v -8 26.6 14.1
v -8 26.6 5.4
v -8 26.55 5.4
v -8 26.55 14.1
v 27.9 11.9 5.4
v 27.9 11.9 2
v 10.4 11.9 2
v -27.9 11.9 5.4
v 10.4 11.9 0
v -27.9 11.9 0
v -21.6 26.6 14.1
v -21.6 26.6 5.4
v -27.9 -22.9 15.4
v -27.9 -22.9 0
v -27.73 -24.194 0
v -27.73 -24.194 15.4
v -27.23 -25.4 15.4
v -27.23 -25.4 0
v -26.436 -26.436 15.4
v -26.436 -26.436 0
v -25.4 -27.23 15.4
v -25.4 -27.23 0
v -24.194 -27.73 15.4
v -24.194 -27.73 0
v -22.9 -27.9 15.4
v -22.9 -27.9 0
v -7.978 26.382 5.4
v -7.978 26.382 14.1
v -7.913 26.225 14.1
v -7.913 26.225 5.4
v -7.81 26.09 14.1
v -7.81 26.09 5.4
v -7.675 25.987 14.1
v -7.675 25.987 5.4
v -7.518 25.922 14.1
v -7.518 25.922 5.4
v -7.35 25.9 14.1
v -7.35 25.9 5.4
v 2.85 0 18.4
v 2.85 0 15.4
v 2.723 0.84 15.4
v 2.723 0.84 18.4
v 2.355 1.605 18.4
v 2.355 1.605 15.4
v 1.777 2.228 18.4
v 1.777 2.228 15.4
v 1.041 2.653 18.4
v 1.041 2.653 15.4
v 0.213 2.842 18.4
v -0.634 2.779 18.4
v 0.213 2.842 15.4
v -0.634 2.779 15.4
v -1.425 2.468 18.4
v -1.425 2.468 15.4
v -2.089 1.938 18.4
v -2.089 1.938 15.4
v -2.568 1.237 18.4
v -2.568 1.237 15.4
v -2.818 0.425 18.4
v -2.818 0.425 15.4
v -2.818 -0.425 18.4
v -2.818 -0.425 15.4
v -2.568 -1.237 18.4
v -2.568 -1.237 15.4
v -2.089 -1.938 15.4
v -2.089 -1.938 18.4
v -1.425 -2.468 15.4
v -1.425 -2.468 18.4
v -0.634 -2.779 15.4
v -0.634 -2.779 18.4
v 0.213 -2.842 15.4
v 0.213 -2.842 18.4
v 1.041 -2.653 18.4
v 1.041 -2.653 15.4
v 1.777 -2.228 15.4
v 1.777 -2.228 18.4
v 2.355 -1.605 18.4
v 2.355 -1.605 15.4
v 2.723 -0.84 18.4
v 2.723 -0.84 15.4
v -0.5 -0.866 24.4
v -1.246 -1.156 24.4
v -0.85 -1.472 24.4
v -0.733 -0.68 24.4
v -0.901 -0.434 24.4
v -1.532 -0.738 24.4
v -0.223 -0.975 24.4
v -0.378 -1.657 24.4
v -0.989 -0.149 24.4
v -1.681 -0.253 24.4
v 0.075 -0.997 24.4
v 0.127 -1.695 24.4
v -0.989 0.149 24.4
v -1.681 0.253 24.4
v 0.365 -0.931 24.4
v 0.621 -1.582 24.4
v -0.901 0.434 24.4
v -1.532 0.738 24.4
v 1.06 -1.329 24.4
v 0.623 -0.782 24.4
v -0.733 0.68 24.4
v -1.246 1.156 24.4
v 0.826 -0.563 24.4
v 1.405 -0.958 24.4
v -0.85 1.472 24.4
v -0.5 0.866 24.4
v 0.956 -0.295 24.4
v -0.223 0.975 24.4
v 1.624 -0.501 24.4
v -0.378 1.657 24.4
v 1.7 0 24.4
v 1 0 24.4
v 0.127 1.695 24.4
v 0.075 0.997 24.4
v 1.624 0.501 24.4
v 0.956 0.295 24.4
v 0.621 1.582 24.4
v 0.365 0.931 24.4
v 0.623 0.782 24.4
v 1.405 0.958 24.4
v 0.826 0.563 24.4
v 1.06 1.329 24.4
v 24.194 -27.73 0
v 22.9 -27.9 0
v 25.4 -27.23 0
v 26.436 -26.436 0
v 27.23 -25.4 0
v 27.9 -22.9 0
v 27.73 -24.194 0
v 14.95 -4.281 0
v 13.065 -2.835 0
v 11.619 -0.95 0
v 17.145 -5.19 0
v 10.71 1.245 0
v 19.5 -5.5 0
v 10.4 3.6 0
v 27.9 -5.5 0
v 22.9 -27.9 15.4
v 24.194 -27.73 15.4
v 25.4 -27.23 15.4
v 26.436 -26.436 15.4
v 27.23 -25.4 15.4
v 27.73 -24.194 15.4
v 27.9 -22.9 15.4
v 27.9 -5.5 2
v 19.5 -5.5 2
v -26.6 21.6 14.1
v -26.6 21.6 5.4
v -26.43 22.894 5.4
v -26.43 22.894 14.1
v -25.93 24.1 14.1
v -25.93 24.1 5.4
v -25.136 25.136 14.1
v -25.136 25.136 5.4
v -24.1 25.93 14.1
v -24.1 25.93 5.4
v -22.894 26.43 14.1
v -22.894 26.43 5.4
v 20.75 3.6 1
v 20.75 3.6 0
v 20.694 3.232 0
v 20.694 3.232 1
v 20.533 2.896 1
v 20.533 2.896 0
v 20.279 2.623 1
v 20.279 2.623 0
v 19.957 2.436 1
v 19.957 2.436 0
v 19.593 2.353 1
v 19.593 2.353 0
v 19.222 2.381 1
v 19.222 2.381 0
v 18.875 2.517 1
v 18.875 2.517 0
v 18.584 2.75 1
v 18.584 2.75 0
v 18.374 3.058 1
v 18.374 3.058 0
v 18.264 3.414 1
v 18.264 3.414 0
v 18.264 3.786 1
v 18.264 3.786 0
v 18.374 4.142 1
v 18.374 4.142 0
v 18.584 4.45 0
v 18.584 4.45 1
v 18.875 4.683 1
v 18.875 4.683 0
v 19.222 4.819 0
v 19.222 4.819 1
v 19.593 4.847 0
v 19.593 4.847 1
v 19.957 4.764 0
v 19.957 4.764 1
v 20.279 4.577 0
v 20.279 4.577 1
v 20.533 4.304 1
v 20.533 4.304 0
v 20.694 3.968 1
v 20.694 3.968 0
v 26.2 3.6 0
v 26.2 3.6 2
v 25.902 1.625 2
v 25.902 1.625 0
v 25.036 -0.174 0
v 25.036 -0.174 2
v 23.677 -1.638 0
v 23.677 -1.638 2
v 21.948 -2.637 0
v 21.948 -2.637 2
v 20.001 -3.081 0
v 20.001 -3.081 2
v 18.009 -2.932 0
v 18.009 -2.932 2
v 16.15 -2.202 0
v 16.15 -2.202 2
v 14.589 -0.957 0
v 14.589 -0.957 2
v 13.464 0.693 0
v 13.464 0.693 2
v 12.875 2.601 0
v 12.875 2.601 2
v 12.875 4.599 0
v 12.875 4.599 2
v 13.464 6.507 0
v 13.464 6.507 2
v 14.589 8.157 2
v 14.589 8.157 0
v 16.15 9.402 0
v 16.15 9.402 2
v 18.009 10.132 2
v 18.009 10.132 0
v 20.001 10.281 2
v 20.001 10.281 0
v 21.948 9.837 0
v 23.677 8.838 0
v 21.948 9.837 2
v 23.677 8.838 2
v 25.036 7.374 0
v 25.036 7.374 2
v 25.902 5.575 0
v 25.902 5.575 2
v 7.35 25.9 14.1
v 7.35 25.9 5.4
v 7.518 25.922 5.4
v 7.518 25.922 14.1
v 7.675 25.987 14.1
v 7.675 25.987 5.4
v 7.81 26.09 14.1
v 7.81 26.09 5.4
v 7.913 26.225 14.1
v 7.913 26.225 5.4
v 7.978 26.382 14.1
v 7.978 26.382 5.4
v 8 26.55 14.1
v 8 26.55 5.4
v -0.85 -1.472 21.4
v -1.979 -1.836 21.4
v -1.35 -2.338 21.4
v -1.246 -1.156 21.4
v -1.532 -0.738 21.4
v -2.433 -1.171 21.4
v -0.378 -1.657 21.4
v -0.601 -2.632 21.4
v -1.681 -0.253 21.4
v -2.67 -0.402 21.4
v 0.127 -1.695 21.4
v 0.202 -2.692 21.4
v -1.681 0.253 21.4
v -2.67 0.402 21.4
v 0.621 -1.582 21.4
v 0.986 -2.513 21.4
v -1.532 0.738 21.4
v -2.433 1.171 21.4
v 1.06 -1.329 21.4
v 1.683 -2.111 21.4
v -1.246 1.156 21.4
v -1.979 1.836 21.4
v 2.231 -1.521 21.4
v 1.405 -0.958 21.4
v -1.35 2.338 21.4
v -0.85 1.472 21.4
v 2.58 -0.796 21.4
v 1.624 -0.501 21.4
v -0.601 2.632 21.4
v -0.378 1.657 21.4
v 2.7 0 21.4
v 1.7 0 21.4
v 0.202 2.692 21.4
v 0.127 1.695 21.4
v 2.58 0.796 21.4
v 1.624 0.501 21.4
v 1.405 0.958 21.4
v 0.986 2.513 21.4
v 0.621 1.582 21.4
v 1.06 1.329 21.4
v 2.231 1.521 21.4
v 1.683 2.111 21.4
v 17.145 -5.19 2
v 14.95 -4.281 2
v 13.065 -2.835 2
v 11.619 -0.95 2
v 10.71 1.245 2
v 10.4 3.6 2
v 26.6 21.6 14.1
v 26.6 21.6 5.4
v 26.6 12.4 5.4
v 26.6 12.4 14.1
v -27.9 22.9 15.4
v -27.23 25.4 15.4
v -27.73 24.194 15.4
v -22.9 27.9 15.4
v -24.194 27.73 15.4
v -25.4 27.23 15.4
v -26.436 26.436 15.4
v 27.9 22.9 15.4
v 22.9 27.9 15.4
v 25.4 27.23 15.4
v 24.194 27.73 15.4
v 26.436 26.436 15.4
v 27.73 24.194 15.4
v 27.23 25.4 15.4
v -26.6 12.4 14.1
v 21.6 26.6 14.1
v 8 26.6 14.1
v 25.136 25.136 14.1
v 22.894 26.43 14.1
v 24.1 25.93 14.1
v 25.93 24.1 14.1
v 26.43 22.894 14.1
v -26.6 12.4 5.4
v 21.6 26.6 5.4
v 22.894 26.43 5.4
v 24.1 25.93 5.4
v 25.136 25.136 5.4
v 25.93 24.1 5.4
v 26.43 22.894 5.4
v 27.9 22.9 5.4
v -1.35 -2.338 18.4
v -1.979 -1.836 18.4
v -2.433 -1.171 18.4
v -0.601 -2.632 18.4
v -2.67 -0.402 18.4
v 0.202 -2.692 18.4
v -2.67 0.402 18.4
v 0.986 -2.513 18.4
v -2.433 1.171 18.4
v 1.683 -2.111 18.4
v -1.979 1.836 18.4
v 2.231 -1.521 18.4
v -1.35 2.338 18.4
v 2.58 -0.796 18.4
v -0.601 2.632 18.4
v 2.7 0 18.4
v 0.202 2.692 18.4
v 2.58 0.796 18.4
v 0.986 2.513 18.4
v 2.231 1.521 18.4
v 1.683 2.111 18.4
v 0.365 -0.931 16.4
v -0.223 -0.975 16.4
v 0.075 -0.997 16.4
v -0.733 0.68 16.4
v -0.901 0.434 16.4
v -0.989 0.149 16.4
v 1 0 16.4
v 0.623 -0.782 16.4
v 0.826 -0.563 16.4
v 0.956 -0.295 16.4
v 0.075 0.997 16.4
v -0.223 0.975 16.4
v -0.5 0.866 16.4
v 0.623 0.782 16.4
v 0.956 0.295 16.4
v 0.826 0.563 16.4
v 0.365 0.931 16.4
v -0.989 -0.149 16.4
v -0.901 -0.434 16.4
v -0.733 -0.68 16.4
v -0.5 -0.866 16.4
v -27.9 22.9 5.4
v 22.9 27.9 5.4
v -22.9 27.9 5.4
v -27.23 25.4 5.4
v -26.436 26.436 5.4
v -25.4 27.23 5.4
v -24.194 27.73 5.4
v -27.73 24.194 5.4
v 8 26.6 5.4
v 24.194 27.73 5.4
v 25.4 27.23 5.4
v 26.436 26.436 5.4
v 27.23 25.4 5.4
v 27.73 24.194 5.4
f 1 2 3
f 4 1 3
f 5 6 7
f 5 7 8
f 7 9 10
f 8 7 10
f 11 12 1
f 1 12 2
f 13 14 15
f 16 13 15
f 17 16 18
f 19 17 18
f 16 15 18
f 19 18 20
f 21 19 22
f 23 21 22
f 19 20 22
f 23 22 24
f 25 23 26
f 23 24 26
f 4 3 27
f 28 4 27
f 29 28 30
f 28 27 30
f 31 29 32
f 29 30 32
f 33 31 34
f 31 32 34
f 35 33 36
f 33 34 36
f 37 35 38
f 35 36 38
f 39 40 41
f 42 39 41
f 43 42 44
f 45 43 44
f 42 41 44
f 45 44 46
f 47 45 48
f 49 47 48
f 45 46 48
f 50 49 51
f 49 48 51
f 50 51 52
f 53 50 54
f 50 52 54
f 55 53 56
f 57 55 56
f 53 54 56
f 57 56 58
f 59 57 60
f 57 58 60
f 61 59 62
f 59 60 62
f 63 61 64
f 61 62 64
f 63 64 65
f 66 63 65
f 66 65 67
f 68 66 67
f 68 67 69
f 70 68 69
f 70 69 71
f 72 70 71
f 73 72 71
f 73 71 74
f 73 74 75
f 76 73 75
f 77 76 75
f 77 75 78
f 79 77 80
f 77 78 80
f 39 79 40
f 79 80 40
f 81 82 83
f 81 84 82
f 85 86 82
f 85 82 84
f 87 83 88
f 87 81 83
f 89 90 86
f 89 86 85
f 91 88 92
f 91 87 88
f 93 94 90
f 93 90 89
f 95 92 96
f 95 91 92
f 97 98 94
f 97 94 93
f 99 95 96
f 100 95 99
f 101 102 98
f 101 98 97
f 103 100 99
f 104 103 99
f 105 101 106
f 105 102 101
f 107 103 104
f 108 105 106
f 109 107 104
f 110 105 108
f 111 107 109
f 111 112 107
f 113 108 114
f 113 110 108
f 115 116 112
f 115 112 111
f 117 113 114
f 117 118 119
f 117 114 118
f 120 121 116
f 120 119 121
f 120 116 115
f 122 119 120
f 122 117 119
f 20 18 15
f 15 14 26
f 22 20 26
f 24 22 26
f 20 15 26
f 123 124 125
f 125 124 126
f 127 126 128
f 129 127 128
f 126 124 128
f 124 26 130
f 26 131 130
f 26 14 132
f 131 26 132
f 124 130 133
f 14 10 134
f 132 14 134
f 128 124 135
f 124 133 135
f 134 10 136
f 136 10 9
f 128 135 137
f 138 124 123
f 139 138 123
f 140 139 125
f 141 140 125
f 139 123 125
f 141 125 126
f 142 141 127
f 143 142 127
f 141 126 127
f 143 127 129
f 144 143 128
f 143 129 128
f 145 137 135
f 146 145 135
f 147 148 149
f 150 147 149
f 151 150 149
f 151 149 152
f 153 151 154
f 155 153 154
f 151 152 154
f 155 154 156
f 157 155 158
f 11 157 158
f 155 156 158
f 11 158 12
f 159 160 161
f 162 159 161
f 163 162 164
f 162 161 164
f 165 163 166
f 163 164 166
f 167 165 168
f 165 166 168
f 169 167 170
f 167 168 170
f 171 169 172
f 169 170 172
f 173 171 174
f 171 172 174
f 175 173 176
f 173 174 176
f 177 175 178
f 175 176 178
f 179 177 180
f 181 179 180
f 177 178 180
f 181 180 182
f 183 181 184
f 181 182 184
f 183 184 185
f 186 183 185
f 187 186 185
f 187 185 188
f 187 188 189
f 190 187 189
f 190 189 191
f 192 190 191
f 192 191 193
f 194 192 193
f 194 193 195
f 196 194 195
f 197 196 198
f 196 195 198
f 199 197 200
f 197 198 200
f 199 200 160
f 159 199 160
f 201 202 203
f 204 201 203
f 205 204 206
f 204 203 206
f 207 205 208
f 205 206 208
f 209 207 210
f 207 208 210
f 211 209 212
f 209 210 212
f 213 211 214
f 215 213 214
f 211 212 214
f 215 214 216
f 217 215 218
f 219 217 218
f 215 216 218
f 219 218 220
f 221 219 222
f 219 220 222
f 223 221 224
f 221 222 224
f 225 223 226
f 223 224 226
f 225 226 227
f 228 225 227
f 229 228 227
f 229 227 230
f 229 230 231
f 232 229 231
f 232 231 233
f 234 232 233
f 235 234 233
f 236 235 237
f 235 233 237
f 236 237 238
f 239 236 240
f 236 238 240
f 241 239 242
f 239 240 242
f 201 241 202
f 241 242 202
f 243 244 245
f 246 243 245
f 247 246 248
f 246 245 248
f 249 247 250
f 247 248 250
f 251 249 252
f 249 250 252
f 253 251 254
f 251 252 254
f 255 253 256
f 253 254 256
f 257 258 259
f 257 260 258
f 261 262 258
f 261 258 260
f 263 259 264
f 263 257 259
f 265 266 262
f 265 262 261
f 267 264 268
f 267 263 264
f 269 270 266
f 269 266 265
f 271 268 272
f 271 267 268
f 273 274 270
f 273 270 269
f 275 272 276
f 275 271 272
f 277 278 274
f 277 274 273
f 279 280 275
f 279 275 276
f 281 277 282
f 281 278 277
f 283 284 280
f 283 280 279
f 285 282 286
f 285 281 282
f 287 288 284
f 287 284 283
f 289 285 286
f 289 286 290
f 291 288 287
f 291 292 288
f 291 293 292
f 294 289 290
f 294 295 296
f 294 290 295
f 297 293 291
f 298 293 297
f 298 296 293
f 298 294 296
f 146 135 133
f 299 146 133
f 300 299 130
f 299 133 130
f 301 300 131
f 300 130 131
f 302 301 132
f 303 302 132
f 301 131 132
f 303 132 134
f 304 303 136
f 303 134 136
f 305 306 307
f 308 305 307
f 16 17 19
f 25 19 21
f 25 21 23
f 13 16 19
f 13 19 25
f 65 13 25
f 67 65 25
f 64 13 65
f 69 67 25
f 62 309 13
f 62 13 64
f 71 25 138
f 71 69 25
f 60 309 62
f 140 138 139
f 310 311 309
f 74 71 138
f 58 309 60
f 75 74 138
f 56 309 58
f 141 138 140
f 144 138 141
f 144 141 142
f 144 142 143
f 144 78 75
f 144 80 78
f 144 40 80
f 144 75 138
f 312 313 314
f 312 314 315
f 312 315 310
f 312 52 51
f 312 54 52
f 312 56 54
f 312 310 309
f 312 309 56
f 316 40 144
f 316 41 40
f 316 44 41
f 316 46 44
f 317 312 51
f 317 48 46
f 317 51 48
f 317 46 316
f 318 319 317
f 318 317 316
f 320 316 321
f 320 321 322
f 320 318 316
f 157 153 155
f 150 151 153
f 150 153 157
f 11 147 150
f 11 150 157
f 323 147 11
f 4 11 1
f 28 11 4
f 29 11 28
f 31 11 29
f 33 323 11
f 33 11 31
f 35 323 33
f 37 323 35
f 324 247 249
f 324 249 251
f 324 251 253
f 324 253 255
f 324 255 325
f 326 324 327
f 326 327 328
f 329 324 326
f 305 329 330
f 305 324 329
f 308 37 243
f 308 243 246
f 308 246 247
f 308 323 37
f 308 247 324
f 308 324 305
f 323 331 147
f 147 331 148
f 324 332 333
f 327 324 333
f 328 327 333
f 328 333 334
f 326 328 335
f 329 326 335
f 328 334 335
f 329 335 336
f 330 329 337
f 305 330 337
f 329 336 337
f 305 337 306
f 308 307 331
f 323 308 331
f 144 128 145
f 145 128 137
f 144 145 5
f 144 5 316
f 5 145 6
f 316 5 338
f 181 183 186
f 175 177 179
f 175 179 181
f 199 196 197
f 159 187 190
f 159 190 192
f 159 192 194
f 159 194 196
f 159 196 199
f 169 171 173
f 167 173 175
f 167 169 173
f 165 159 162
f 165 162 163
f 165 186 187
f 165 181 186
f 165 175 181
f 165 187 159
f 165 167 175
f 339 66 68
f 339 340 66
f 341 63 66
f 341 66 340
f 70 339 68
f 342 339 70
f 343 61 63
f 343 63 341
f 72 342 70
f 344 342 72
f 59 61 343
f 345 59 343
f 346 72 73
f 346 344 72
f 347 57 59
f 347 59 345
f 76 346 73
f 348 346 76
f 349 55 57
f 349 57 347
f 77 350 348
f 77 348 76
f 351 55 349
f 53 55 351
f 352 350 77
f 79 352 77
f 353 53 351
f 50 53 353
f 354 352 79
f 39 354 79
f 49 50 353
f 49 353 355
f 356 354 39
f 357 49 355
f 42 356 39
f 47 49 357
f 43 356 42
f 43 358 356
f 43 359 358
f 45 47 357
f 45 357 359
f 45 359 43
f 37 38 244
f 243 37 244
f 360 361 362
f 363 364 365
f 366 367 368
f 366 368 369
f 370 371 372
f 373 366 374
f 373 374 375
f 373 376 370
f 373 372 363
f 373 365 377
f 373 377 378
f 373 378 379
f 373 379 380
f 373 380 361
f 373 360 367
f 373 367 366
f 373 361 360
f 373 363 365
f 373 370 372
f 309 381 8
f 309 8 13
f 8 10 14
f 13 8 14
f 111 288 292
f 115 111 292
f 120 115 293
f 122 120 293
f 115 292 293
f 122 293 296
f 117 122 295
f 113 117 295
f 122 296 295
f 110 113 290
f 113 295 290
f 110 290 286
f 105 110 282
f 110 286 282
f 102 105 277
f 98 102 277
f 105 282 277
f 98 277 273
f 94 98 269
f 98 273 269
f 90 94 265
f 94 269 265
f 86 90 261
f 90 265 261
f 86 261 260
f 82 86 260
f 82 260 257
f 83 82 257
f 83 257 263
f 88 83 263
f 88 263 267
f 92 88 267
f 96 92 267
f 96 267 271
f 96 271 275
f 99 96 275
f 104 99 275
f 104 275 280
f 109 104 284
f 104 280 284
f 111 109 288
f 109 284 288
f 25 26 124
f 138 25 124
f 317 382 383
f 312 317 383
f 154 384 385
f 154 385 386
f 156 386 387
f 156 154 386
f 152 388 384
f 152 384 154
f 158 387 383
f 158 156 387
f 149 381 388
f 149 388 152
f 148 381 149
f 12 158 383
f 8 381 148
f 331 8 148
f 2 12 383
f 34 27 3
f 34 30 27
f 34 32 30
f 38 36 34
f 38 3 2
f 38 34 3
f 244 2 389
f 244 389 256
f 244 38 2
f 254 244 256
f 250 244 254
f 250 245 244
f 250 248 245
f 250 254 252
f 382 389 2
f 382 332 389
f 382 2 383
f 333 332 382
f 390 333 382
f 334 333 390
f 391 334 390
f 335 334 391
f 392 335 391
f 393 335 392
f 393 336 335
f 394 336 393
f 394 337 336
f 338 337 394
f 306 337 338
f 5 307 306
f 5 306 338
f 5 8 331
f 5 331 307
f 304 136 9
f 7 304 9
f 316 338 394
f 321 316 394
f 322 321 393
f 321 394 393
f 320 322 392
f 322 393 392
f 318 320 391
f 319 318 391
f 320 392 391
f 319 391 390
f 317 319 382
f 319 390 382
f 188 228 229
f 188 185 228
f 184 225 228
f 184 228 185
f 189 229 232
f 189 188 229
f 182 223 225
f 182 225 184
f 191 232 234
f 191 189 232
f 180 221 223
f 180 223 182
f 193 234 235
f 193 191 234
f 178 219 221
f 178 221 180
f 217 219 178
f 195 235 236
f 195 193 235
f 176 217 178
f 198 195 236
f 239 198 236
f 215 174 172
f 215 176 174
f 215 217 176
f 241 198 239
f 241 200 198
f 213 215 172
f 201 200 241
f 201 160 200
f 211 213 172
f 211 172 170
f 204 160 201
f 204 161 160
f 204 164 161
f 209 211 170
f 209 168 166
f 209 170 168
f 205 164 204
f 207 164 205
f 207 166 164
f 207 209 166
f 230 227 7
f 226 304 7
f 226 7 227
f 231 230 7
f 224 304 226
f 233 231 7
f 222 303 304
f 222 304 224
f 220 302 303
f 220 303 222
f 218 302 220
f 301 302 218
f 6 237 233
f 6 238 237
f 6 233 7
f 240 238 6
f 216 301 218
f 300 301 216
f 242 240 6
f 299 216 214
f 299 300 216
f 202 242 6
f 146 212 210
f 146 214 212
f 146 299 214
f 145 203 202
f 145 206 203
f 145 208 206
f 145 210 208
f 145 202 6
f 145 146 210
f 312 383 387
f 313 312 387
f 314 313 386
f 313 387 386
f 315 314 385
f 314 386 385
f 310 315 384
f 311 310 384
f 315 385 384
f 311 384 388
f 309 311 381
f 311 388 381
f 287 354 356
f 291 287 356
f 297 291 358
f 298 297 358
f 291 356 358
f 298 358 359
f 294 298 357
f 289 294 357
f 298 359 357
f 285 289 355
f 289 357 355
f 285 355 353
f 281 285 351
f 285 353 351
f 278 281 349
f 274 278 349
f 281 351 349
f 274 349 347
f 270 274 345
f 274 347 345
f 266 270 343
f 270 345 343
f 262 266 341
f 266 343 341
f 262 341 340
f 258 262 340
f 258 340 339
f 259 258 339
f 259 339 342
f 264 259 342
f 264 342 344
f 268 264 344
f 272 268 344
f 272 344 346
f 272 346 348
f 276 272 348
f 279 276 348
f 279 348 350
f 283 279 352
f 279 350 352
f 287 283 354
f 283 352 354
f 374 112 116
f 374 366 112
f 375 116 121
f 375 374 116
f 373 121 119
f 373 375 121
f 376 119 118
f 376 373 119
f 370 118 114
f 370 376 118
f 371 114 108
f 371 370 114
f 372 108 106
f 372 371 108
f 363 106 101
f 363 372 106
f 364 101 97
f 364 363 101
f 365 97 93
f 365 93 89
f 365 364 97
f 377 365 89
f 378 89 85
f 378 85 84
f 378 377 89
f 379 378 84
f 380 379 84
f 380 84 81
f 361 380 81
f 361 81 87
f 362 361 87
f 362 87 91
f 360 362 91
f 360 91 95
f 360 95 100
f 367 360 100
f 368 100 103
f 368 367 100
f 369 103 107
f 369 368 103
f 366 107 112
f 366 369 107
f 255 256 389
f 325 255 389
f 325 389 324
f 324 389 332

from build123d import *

# Parameters (mm, degrees)
F1_DEPTH  = 15.4
F3_DEPTH  = 5.4
F5_DEPTH  = 2
F6_R      = 6.7
F7_DEPTH  = 2
F9_DEPTH  = 8.7
F10_R     = 1.25
F11_DEPTH = 1
F12_R     = 2.85
F13_DEPTH = 3
F14_R     = 2.7
F15_DEPTH = 3
F16_R     = 1
F17_DEPTH = 5
F18_R     = 1.7
F18_R_2   = 1
F19_DEPTH = 3


with BuildPart() as f1:
    # F0 (on Top) → F1 (new body)
    with BuildSketch(Plane.XY):
        with BuildLine():
            Line((-22.9, -27.9), (22.9, -27.9))
            ThreePointArc((22.9, -27.9), (26.4355339059, -26.4355339059), (27.9, -22.9))
            Line((27.9, -22.9), (27.9, 22.9))
            ThreePointArc((27.9, 22.9), (26.4355339059, 26.4355339059), (22.9, 27.9))
            Line((22.9, 27.9), (-22.9, 27.9))
            ThreePointArc((-22.9, 27.9), (-26.4355339059, 26.4355339059), (-27.9, 22.9))
            Line((-27.9, 22.9), (-27.9, -22.9))
            ThreePointArc((-27.9, -22.9), (-26.4355339059, -26.4355339059), (-22.9, -27.9))
        make_face()
    extrude(amount=F1_DEPTH)

    # F2 (on face) → F3 (cut)
    with BuildSketch(Plane(origin=(0, 0, 0), x_dir=(1, 0, 0), z_dir=(0, 0, -1))):
        with BuildLine():
            Line((27.9, -11.9), (-27.9, -11.9))
            Line((-27.9, -11.9), (-27.9, -22.9))
            ThreePointArc((-27.9, -22.9), (-26.4355339059, -26.4355339059), (-22.9, -27.9))
            Line((-22.9, -27.9), (22.9, -27.9))
            ThreePointArc((22.9, -27.9), (26.4355339059, -26.4355339059), (27.9, -22.9))
            Line((27.9, -22.9), (27.9, -11.9))
        make_face()
    extrude(amount=-F3_DEPTH, mode=Mode.SUBTRACT)

    # F4 (on face) → F5 (cut)
    with BuildSketch(Plane(origin=(0, 0, 0), x_dir=(1, 0, 0), z_dir=(0, 0, -1))):
        with BuildLine():
            Line((27.9, -11.9), (27.9, 5.5))
            Line((27.9, 5.5), (19.5, 5.5))
            ThreePointArc((19.5, 5.5), (13.0653282912, 2.8346717088), (10.4, -3.6))
            Line((10.4, -3.6), (10.4, -11.9))
            Line((10.4, -11.9), (27.9, -11.9))
        make_face()
    extrude(amount=-F5_DEPTH, mode=Mode.SUBTRACT)

    # F6 (on face) → F7 (join)
    with BuildSketch(Plane(origin=(0, 0, 2), x_dir=(1, 0, 0), z_dir=(0, 0, -1))):
        with Locations((19.5, -3.6)):
            Circle(F6_R)
    extrude(amount=F7_DEPTH)

    # F8 (on face) → F9 (cut)
    with BuildSketch(Plane(origin=(0, 0, 5.4), x_dir=(1, 0, 0), z_dir=(0, 0, -1))):
        with BuildLine():
            Line((8, -26.6), (21.6, -26.6))
            ThreePointArc((21.6, -26.6), (25.1355339059, -25.1355339059), (26.6, -21.6))
            Line((26.6, -21.6), (26.6, -12.4))
            Line((26.6, -12.4), (-26.6, -12.4))
            Line((-26.6, -12.4), (-26.6, -21.6))
            ThreePointArc((-26.6, -21.6), (-25.1355339059, -25.1355339059), (-21.6, -26.6))
            Line((-21.6, -26.6), (-8, -26.6))
            Line((-8, -26.6), (-8, -26.55))
            ThreePointArc((-8, -26.55), (-7.8096194078, -26.0903805922), (-7.35, -25.9))
            Line((-7.35, -25.9), (7.35, -25.9))
            ThreePointArc((7.35, -25.9), (7.8096194078, -26.0903805922), (8, -26.55))
            Line((8, -26.55), (8, -26.6))
        make_face()
    extrude(amount=-F9_DEPTH, mode=Mode.SUBTRACT)

    # F10 (on face) → F11 (cut)
    with BuildSketch(Plane(origin=(0, 0, 0), x_dir=(1, 0, 0), z_dir=(0, 0, -1))):
        with Locations((19.5, -3.6)):
            Circle(F10_R)
    extrude(amount=-F11_DEPTH, mode=Mode.SUBTRACT)

    # F12 (on face) → F13 (join)
    with BuildSketch(Plane.XY.offset(15.4)):
        Circle(F12_R)
    extrude(amount=F13_DEPTH)

    # F14 (on face) → F15 (join)
    with BuildSketch(Plane.XY.offset(18.4)):
        Circle(F14_R)
    extrude(amount=F15_DEPTH)

    # F16 (on face) → F17 (cut)
    with BuildSketch(Plane.XY.offset(21.4)):
        Circle(F16_R)
    extrude(amount=-F17_DEPTH, mode=Mode.SUBTRACT)

    # F18 (on face) → F19 (join)
    with BuildSketch(Plane.XY.offset(21.4)):
        Circle(F18_R)
        Circle(F18_R_2, mode=Mode.SUBTRACT)
    extrude(amount=F19_DEPTH)


solid = f1.part
